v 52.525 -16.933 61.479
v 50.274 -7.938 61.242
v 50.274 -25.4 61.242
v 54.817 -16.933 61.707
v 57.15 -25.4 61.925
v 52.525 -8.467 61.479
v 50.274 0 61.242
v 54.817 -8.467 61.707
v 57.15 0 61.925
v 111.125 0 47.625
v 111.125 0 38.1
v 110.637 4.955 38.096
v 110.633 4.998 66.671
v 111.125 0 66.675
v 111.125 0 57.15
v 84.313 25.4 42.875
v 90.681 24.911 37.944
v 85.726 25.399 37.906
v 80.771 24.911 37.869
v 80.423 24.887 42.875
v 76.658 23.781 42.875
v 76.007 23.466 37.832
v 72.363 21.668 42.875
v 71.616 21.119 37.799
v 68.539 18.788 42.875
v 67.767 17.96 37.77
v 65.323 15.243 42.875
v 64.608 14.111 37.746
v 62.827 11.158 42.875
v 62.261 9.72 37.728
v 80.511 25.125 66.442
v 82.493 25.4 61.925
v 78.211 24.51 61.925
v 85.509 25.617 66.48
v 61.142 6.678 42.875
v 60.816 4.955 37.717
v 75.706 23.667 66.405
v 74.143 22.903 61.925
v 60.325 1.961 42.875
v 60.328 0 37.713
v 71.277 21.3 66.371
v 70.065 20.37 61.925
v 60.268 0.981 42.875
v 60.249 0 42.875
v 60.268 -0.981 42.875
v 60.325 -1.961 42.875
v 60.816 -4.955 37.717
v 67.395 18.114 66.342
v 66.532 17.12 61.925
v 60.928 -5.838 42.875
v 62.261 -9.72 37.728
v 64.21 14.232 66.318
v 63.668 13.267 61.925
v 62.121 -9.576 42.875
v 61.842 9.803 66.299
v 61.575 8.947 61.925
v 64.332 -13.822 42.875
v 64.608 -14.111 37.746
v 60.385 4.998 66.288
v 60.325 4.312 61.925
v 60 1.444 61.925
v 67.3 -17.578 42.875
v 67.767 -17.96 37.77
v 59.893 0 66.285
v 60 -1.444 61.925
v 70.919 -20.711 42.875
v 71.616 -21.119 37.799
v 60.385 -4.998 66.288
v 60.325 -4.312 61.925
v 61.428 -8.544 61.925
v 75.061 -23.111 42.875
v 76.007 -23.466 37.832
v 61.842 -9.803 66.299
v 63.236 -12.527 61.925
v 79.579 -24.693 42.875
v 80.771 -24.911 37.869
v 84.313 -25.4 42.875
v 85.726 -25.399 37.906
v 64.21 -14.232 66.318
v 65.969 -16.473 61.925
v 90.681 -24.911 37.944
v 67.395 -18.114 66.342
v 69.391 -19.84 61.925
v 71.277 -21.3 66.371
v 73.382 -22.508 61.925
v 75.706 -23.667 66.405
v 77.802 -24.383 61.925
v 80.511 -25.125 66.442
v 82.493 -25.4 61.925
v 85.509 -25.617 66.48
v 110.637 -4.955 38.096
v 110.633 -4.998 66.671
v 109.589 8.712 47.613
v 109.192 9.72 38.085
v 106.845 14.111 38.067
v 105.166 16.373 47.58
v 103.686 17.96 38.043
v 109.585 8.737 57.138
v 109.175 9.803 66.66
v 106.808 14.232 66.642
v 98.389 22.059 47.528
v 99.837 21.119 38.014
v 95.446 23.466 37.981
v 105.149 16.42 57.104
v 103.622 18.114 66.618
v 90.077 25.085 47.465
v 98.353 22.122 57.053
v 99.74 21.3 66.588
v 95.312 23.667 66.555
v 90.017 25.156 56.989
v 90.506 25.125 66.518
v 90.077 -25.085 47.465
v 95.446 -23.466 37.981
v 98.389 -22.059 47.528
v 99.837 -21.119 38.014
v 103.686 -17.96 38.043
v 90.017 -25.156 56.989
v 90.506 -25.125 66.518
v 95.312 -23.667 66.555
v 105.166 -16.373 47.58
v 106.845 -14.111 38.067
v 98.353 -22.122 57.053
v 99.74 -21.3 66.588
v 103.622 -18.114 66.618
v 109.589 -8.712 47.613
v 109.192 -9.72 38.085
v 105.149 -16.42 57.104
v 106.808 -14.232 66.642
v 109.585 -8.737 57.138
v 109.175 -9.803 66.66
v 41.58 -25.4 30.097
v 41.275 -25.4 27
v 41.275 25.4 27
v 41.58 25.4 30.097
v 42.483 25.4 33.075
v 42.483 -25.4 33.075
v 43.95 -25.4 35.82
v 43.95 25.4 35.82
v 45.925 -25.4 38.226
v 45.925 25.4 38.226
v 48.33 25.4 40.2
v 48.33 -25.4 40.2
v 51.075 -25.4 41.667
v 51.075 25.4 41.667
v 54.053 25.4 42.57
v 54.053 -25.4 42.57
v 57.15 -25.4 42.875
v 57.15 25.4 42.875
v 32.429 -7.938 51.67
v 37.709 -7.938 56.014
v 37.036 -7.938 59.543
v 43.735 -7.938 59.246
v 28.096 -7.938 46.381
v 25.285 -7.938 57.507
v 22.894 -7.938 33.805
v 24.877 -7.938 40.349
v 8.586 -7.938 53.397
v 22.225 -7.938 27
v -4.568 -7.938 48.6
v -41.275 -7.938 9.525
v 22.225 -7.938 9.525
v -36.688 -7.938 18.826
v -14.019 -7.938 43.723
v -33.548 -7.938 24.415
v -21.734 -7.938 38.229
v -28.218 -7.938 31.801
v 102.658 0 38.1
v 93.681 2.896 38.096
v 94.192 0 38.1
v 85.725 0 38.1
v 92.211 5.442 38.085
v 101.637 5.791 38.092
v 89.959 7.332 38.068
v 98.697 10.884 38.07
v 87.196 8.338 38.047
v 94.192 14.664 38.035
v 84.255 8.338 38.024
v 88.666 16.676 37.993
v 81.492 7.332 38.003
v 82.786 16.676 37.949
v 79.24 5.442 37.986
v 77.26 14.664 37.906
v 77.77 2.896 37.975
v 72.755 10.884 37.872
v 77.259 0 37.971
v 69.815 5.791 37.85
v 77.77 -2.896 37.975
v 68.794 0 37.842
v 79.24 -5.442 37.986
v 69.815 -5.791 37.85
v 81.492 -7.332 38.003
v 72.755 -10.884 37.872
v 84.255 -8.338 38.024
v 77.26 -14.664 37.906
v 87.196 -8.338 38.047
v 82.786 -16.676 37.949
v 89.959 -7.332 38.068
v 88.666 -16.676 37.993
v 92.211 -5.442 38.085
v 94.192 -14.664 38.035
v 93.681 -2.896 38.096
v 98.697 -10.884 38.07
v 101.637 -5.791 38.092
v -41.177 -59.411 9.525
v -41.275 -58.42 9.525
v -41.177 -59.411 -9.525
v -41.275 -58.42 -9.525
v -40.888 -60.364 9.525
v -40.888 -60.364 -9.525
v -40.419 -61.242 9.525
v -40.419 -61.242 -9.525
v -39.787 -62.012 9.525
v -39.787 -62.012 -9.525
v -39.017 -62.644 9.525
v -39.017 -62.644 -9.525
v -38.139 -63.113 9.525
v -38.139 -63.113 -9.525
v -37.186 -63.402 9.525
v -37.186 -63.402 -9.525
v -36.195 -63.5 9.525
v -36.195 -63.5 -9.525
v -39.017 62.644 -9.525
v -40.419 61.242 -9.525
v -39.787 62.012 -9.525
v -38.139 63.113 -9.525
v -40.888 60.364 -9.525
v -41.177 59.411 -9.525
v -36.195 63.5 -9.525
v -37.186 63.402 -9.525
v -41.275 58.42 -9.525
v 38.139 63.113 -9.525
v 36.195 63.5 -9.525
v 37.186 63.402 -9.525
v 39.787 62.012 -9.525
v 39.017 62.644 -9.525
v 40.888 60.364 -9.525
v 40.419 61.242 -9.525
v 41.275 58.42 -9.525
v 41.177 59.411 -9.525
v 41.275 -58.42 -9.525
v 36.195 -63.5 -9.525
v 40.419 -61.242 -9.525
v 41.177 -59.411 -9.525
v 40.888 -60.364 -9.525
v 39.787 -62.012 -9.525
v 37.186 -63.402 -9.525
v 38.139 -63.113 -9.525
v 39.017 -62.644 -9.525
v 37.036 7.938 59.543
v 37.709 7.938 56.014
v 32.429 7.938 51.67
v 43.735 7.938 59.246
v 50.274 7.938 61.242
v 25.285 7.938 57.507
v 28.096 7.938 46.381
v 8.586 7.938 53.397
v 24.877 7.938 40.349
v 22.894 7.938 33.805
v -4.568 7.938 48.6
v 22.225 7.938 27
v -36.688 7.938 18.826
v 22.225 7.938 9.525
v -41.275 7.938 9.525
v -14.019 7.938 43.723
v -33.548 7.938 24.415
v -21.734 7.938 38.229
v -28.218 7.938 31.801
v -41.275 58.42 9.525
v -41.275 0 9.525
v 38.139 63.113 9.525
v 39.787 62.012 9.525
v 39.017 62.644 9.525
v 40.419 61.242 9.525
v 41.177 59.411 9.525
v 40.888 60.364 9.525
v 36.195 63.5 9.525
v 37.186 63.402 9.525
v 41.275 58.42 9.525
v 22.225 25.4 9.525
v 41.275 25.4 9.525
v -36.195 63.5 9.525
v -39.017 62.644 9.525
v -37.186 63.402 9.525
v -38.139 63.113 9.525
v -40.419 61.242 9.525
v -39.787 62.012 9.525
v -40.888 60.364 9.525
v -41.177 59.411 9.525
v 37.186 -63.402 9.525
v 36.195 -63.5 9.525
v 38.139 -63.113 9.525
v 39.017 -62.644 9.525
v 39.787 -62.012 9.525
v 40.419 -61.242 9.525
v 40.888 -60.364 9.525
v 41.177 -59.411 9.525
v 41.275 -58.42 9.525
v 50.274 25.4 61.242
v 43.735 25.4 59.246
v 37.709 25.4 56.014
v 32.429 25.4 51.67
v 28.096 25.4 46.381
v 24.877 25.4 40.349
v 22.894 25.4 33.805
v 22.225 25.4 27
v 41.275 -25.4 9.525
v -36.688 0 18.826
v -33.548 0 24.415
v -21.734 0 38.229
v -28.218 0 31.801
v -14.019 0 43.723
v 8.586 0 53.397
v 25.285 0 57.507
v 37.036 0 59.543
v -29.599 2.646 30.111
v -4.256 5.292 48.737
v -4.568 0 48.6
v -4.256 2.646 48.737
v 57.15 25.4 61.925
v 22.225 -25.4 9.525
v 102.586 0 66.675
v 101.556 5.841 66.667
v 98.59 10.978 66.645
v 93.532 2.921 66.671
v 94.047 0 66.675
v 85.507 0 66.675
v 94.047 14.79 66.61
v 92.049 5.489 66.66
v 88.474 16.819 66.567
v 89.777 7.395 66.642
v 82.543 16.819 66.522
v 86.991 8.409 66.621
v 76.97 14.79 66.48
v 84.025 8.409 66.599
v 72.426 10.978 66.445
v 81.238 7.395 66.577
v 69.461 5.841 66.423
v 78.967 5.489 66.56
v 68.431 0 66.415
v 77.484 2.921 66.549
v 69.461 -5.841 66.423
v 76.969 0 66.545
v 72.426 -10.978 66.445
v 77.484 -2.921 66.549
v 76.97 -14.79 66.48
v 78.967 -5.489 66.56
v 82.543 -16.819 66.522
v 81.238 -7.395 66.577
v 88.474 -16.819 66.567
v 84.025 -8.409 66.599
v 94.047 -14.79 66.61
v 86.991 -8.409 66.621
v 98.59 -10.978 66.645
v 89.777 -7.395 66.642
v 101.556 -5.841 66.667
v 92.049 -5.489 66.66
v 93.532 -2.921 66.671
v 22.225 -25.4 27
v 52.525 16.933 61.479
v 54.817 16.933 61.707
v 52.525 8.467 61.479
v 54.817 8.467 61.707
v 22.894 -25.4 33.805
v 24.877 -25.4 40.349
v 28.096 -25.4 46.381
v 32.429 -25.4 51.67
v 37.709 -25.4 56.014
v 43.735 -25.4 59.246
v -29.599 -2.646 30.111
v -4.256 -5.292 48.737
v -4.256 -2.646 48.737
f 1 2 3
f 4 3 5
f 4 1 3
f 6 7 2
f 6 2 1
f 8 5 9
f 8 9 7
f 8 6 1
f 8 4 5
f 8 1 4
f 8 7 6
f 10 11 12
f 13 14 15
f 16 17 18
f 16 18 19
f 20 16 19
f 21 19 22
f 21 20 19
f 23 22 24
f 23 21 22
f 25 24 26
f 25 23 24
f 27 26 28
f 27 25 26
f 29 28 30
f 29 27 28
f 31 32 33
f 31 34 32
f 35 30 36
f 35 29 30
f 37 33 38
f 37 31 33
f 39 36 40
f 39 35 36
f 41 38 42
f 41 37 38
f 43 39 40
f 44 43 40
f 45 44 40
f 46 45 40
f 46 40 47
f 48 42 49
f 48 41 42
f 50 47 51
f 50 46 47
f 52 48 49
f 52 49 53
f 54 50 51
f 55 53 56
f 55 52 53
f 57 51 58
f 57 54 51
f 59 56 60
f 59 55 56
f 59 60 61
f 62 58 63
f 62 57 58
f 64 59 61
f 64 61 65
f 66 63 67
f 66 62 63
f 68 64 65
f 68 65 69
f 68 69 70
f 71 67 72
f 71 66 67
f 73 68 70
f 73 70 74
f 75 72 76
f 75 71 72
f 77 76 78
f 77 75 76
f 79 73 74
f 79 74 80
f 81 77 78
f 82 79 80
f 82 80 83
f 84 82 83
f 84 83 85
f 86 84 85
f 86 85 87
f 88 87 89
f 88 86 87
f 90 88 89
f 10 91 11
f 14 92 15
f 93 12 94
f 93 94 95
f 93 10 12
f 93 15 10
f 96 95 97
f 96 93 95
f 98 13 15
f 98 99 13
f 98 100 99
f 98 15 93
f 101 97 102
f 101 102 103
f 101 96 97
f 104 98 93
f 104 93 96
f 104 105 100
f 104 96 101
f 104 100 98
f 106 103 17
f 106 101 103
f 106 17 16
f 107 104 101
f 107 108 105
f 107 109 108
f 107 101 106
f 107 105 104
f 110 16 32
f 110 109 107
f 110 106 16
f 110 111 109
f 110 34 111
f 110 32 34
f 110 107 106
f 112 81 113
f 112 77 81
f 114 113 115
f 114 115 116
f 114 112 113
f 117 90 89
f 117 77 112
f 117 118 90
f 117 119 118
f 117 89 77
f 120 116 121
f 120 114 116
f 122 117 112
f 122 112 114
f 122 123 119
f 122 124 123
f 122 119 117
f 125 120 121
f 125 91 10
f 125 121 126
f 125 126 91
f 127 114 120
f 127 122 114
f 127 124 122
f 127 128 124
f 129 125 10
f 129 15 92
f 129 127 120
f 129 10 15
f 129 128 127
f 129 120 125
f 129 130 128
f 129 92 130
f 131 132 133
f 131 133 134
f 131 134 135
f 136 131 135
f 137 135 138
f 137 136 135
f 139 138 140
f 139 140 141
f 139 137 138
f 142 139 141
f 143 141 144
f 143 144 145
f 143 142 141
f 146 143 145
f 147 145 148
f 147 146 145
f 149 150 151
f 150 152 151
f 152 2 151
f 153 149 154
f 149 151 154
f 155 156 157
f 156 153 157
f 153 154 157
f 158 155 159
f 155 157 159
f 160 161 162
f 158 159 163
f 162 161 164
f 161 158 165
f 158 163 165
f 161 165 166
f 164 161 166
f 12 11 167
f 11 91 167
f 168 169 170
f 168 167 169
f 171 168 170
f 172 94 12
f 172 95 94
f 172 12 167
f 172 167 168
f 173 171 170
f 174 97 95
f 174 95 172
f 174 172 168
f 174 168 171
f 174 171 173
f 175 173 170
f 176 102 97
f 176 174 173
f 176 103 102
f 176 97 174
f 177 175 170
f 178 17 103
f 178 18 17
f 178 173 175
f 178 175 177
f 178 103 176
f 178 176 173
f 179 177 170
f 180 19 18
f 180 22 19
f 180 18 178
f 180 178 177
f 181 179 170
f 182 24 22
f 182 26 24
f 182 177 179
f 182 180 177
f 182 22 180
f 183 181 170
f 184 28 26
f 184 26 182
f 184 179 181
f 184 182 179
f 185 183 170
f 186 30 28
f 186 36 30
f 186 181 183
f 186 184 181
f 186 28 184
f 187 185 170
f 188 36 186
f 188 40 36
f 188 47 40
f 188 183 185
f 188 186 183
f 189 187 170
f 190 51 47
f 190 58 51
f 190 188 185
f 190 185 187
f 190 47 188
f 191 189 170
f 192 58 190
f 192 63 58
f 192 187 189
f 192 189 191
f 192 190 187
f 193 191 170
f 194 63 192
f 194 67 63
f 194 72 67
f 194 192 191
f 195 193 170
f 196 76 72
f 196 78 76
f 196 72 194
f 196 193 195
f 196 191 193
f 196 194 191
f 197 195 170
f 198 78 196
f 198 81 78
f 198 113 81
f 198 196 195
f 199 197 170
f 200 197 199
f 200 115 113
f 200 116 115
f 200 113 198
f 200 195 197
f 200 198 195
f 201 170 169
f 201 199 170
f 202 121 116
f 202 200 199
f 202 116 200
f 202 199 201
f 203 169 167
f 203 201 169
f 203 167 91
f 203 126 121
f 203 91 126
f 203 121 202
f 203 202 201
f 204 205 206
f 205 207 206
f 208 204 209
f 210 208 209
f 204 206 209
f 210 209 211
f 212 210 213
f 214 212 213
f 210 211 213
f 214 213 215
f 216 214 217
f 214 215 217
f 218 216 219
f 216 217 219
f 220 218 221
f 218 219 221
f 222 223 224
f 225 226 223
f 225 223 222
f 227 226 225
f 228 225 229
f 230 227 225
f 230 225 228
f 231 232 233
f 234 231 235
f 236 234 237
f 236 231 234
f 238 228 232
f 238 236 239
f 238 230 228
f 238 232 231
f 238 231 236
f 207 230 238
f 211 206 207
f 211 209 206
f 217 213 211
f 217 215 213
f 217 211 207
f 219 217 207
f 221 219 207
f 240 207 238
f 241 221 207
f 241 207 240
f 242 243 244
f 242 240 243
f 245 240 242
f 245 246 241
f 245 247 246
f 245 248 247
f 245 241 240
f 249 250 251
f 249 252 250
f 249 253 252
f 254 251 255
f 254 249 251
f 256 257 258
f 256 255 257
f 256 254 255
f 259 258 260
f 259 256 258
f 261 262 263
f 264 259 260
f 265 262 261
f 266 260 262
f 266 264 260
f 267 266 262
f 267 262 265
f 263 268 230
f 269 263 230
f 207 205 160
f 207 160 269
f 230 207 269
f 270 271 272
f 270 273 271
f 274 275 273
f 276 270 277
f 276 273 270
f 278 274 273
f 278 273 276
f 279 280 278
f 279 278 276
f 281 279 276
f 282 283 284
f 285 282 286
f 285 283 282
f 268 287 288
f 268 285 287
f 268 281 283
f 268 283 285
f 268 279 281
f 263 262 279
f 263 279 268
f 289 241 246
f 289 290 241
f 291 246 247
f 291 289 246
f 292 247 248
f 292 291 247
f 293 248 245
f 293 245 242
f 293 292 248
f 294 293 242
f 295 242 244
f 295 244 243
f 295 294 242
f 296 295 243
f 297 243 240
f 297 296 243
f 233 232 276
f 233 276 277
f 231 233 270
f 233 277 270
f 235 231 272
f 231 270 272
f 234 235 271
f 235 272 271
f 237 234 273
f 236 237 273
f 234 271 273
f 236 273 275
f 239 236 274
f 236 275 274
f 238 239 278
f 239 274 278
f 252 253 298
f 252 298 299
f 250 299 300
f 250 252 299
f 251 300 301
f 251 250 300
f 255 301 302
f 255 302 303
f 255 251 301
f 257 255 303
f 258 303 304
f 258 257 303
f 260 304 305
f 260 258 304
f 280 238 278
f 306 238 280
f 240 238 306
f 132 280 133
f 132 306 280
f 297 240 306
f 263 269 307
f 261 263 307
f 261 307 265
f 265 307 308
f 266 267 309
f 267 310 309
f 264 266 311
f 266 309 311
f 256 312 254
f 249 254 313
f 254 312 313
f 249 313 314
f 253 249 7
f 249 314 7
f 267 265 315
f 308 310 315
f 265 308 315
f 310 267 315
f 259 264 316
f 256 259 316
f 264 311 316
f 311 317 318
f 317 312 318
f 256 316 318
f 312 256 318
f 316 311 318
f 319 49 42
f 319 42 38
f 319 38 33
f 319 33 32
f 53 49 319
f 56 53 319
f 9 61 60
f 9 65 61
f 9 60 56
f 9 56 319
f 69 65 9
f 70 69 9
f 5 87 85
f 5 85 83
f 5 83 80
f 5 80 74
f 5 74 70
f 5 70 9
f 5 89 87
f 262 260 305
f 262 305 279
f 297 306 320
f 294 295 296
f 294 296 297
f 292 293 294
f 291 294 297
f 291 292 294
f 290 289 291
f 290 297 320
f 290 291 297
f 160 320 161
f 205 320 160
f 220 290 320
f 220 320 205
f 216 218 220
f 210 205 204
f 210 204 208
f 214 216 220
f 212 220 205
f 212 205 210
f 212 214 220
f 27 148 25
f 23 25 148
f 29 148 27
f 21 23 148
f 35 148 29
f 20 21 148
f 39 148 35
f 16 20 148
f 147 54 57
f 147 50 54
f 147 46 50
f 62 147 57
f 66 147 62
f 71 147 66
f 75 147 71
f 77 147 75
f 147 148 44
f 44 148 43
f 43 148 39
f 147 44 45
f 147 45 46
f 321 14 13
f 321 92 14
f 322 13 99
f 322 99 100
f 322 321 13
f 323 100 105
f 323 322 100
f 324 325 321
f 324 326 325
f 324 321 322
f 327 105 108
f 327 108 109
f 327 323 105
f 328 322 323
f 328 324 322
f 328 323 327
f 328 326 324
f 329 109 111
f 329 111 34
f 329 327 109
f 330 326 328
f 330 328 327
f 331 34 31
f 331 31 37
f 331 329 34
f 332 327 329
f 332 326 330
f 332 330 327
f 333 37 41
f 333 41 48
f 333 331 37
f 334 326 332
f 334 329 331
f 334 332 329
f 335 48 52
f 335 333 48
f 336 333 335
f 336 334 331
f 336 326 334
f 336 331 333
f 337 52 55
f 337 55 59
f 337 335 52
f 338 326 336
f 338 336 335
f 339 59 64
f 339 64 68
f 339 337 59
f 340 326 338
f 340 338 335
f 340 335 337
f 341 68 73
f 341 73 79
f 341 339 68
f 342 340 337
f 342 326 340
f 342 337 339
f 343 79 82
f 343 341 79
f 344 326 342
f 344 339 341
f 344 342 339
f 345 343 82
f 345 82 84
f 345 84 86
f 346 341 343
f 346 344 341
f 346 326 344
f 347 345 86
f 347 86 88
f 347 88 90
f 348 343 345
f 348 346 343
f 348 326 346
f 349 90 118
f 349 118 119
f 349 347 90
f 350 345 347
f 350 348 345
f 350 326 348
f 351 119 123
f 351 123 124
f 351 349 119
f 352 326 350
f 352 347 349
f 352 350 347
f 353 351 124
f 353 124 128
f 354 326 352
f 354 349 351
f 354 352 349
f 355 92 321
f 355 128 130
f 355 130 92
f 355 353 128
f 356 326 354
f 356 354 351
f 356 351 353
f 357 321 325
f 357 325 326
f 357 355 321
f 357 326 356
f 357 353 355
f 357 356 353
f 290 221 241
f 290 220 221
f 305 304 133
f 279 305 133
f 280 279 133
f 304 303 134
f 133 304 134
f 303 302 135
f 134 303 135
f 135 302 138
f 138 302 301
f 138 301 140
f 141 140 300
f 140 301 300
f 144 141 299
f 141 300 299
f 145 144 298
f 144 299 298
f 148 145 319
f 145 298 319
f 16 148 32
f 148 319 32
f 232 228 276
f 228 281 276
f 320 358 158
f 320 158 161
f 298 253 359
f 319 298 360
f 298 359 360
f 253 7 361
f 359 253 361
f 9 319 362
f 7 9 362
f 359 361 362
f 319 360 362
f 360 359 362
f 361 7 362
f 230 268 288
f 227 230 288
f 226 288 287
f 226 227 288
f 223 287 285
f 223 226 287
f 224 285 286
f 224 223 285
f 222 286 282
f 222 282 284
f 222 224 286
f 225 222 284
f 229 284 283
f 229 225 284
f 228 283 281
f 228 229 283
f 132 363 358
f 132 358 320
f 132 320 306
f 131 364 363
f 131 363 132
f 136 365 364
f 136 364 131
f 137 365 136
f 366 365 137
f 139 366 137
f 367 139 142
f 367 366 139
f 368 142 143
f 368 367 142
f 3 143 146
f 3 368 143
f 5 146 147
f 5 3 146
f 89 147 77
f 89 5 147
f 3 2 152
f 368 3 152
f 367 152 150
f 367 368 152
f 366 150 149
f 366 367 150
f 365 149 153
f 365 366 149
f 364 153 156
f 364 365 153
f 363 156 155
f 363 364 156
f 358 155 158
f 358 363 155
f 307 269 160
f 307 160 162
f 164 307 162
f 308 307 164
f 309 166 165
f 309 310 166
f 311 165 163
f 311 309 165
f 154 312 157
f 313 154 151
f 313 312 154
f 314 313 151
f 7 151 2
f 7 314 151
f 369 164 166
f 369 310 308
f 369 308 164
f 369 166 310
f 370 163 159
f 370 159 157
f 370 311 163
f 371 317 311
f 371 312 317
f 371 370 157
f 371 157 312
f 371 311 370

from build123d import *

# Parameters (mm, degrees)
F1_DEPTH  = 63.5
F2_DEPTH  = 25.4
F4_E5_0_W = 28.3572662234
F4_E5_0_H = 50.8
F5_DEPTH  = 19.05
F6_DEPTH  = 7.9375
F7_R      = 5.08


with BuildPart() as f1:
    # F0 (on Front) → F1 (new body, symmetric)
    with BuildSketch(Plane.XZ):
        Polygon((-41.275, 9.525), (-41.275, -9.525), (41.275, -9.525), (41.275, 9.525), (22.225, 9.525), align=None)
    extrude(amount=F1_DEPTH, both=True)

    # F0 (on Front) → F2 (join, symmetric)
    with BuildSketch(Plane.XZ):
        with BuildLine():
            Line((22.225, 9.525), (41.275, 9.525))
            Line((41.275, 9.525), (41.275, 27.0002))
            ThreePointArc((41.275, 27.0002), (45.9246798487, 38.2255201513), (57.15, 42.8752))
            Line((57.15, 42.8752), (60.325, 42.8752))
            Line((60.325, 42.8752), (60.325, 61.9252))
            Line((60.325, 61.9252), (57.15, 61.9252))
            add(Edge.make_bspline(
                [(50.2742596594, 61.2416926627), (52.505084267, 61.4836028987), (54.7963675205, 61.7116076427), (57.15, 61.9252)],
                knots=[108.25411783, 108.25411783, 108.25411783, 108.25411783, 111.5045361635, 111.5045361635, 111.5045361635, 111.5045361635], degree=3))
            ThreePointArc((50.2742596594, 61.2416926627), (30.1324977432, 49.1318559887), (22.225, 27.0002))
            Line((22.225, 27.0002), (22.225, 9.525))
        make_face()
    extrude(amount=F2_DEPTH, both=True)

    # F0 (on Front) → F3 (revolve)
    with BuildSketch(Plane.XZ):
        Polygon((85.5072662234, 66.675), (85.6886142667, 42.8752), (85.725, 38.1), (111.125, 38.1), (111.125, 66.675), align=None)
    revolve(axis=Axis((85.6161331117, 0, 52.3875), (-0.0076195085, 0, 0.9999709711)))

    # F4_E5_0 (on explicit) → F5 (join)
    with BuildSketch(Plane(origin=(57.15, 25.4, 61.9252), x_dir=(1, 0, 0), z_dir=(0, 0, -1))):
        with Locations((14.1786331117, 25.4)):
            Rectangle(F4_E5_0_W, F4_E5_0_H)
    extrude(amount=F5_DEPTH)

    # F0 (on Front) → F6 (join, symmetric)
    with BuildSketch(Plane.XZ):
        with BuildLine():
            add(Edge.make_bspline(
                [(-41.275, 9.525), (-31.2587030045, 29.7042218625), (-24.022623126, 53.1849514965), (50.2742596594, 61.2416926627)],
                knots=[0, 0, 0, 0, 108.25411783, 108.25411783, 108.25411783, 108.25411783], degree=3))
            Line((-41.275, 9.525), (22.225, 9.525))
            Line((22.225, 9.525), (22.225, 27.0002))
            ThreePointArc((22.225, 27.0002), (30.1324977432, 49.1318559887), (50.2742596594, 61.2416926627))
        make_face()
    extrude(amount=F6_DEPTH, both=True)

    # F7
    f7_edges = [f1.edges().sort_by_distance(p)[0] for p in [
        (41.275, -63.5, 0),
        (-41.275, -63.5, 0),
        (-41.275, 63.5, 0),
        (41.275, 63.5, 0),
    ]]
    fillet(f7_edges, radius=F7_R)


solid = f1.part
